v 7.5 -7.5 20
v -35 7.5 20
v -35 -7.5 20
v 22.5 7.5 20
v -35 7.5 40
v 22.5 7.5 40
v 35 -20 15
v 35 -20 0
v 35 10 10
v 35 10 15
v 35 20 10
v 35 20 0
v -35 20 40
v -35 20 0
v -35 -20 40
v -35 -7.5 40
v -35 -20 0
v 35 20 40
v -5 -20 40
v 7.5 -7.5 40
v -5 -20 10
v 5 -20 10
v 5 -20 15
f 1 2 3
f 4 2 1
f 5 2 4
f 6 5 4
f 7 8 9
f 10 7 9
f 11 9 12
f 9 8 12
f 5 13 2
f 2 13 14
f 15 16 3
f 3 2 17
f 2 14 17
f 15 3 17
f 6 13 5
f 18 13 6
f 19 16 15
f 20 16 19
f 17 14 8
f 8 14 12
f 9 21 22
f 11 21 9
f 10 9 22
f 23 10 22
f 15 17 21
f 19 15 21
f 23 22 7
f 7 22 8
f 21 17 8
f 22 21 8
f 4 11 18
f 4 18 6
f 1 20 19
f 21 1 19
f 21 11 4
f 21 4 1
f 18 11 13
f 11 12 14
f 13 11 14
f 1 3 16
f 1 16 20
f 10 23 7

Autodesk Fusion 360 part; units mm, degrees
sketch "Sketch1" plane through (0, 0, 0) normal (0, 0, 1) x (1, 0, 0)
  line L0 (35, 20) -> (-35, 20)
  line L1 (-35, 20) -> (-35, -20)
  line L2 (-35, -20) -> (35, -20)
  line L3 (35, -20) -> (35, 20)
  line L4 (0, -20) -> (-5, -20)
  line L5 (0, -20) -> (5, -20)
  line L6 (35, 20) -> (35, 15)
  line L7 (35, 15) -> (35, 10)
  line L8 (35, 10) -> (5, -20)
  line L9 (35, 20) -> (-5, -20)
  line L10 (-35, -7.5) -> (7.5, -7.5)
  line L11 (-35, 7.5) -> (22.5, 7.5)
  dimension "d8" = 70
  dimension "d9" = 40
  dimension "d14" = 5
  dimension "d15" = 5
  dimension "d16" = 5
  dimension "d17" = 5
extrude "Extrude1" add sketch "Sketch1" along normal blind 10 contours L2 L3 L4 L5 L6 L7 L8 L9
extrude "Extrude2" add sketch "Sketch1" along normal blind 40 contours L0 L1 L9 L11 | L1 L2 L9 L10
extrude "Extrude3" add sketch "Sketch1" along normal blind 15 contours L2 L3 L8
extrude "Extrude4" add sketch "Sketch1" along normal blind 20 contours L1 L9 L10 L11
